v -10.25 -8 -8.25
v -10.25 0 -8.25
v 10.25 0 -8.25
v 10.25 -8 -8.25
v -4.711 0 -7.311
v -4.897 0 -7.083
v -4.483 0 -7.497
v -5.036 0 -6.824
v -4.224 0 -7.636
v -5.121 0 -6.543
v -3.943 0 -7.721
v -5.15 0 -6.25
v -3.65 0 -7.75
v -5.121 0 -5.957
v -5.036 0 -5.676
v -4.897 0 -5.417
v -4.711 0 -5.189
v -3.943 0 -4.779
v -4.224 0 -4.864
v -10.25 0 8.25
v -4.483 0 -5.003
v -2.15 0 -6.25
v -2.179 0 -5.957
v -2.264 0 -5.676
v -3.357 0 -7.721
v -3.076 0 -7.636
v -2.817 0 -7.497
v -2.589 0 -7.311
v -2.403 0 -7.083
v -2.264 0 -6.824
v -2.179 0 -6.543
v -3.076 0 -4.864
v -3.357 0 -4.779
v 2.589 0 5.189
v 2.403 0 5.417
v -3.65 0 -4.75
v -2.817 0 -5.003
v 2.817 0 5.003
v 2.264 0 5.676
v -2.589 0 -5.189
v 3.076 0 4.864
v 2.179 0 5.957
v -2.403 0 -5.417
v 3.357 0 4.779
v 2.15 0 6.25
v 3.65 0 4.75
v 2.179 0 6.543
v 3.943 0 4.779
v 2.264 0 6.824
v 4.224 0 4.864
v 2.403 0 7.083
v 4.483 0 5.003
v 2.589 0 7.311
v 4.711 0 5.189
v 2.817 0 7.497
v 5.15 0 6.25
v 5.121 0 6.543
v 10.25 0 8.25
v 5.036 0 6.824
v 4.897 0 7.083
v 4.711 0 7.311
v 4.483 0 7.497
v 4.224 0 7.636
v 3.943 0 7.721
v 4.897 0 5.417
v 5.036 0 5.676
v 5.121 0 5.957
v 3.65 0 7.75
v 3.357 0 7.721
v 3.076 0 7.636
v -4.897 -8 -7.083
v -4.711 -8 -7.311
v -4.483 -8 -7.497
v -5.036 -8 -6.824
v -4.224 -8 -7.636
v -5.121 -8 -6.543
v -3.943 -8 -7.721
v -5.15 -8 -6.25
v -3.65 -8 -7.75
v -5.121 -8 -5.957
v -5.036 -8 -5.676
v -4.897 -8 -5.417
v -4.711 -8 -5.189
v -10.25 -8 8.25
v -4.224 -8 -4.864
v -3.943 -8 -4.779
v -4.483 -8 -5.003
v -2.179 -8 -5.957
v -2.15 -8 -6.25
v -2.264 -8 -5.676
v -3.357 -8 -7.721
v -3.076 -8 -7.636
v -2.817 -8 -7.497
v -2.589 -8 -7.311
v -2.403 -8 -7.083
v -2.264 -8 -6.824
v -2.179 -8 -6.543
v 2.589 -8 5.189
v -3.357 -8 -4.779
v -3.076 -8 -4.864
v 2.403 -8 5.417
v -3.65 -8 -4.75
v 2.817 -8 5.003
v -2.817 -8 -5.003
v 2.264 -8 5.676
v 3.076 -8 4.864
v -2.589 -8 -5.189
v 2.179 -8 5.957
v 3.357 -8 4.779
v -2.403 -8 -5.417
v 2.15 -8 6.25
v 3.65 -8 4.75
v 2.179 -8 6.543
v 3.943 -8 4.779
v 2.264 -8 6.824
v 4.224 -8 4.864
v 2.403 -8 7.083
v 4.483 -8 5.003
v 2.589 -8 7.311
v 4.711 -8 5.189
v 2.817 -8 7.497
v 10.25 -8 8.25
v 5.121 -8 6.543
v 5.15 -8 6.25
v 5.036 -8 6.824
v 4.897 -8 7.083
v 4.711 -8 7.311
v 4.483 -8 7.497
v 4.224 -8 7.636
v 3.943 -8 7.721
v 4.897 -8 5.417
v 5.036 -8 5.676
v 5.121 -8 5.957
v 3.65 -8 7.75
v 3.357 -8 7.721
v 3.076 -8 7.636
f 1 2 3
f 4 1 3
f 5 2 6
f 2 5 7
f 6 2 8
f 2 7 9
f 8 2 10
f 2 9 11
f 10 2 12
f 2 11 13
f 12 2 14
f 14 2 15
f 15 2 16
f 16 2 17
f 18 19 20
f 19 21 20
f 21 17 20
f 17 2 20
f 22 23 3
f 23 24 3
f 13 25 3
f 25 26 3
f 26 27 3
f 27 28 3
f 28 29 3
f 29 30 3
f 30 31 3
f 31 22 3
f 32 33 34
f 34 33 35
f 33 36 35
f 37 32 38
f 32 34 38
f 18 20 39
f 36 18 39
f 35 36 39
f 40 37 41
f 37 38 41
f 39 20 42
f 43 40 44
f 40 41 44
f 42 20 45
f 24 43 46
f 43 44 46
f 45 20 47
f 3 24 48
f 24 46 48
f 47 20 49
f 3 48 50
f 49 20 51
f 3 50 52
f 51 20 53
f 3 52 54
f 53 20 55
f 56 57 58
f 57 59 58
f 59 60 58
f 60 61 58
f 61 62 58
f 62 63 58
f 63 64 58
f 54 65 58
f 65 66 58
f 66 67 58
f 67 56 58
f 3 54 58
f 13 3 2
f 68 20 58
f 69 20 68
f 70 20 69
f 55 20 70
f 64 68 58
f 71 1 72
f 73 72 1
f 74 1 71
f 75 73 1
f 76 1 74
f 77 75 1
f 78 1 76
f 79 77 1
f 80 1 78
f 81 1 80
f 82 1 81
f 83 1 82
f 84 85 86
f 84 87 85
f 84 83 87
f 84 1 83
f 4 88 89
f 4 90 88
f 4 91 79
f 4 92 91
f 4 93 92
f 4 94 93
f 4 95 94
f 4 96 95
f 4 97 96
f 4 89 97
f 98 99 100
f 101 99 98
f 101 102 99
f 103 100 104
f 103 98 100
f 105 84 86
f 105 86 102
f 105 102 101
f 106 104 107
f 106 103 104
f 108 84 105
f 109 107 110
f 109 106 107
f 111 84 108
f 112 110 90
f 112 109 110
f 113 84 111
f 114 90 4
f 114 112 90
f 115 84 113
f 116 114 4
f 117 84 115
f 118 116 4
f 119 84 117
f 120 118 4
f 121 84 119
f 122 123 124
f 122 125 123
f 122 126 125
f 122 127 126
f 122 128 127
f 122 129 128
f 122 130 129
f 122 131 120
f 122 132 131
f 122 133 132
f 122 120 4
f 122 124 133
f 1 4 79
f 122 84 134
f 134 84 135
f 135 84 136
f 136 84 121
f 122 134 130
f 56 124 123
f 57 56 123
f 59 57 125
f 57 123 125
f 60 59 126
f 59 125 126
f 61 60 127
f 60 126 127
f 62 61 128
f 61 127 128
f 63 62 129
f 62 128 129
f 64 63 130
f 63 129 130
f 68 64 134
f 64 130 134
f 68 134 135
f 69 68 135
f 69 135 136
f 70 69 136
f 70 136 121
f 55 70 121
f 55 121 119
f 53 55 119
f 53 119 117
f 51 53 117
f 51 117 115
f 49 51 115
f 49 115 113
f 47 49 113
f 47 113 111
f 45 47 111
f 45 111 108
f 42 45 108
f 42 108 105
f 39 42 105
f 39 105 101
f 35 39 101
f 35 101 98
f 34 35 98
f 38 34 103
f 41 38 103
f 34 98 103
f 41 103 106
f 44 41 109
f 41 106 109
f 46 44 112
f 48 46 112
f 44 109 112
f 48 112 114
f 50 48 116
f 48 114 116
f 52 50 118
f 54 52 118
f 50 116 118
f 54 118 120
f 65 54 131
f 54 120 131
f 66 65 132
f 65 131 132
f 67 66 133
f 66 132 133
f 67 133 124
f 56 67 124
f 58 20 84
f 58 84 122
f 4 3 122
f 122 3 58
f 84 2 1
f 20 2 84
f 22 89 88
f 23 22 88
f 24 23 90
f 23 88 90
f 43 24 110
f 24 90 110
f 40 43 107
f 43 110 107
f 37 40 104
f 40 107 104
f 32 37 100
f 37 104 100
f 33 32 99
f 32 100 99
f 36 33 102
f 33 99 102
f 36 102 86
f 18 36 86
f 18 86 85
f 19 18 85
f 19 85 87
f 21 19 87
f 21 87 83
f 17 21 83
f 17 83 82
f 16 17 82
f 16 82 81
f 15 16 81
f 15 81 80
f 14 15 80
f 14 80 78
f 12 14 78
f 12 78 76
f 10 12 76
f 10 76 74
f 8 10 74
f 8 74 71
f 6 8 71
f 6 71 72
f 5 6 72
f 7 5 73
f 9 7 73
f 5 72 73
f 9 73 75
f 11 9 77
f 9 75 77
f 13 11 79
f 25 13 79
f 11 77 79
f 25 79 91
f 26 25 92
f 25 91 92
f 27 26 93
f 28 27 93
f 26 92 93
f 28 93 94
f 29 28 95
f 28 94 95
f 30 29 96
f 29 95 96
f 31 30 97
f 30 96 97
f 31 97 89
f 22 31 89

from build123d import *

# Parameters (mm, degrees)
F0_W     = 20.5
F0_H     = 16.5
F1_DEPTH = 8
F2_R     = 1.5
F3_DEPTH = 25
F4_DEPTH = 25
F5_DEPTH = 25


with BuildPart() as f1:
    # F0 (on Front) → F1 (new body)
    with BuildSketch(Plane.XZ):
        Rectangle(F0_W, F0_H)
    extrude(amount=F1_DEPTH)

    # F2 (on face) → F3 (cut)
    with BuildSketch(Plane.XZ.offset(8)):
        with Locations((3.65, 6.25)):
            Circle(F2_R)
        with Locations((-3.65, -6.25)):
            Circle(F2_R)
    extrude(amount=-F3_DEPTH, mode=Mode.SUBTRACT)

    # F2 (on face) → F4 (cut)
    with BuildSketch(Plane.XZ.offset(8)):
        with Locations((3.65, 6.25)):
            Circle(F2_R)
        with Locations((-3.65, -6.25)):
            Circle(F2_R)
    extrude(amount=-F4_DEPTH, mode=Mode.SUBTRACT)

    # F2 (on face) → F5 (cut)
    with BuildSketch(Plane.XZ.offset(8)):
        with Locations((3.65, 6.25)):
            Circle(F2_R)
        with Locations((-3.65, -6.25)):
            Circle(F2_R)
    extrude(amount=-F5_DEPTH, mode=Mode.SUBTRACT)


solid = f1.part
